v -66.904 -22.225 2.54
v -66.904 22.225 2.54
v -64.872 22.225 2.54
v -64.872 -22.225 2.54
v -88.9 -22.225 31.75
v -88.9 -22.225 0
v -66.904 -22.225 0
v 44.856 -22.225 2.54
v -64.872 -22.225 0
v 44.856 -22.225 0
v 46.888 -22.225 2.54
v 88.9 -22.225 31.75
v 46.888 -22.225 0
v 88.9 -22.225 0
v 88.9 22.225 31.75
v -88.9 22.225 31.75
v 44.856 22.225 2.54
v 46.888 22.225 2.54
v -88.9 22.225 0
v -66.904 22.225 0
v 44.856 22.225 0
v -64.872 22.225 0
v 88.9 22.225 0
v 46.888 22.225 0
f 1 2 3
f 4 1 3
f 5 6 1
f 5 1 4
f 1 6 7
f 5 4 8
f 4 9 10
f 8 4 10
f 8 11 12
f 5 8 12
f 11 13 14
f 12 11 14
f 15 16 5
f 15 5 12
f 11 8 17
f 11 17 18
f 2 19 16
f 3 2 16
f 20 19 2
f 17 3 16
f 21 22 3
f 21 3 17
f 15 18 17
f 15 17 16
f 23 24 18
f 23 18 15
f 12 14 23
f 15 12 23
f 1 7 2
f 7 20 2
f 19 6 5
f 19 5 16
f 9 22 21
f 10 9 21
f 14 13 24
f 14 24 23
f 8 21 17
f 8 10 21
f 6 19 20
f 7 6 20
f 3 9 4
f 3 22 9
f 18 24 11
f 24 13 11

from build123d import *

# Parameters (mm, degrees)
F0_W     = 177.8
F0_H     = 44.45
F1_DEPTH = 31.75
F2_W     = 2.032
F2_H     = 5.08
F2_H_2   = 2.957623
F3_DEPTH = 70.866


with BuildPart() as f1:
    # F0 (on Top) → F1 (new body)
    with BuildSketch(Plane.XY):
        Rectangle(F0_W, F0_H)
    extrude(amount=F1_DEPTH)

    # F2 (on Front) → F3 (cut, symmetric)
    with BuildSketch(Plane.XZ):
        with Locations((-65.8876, 0)):
            Rectangle(F2_W, F2_H)
        with Locations((45.8724, 1.061189)):
            Rectangle(F2_W, F2_H_2)
    extrude(amount=F3_DEPTH, both=True, mode=Mode.SUBTRACT)


solid = f1.part
